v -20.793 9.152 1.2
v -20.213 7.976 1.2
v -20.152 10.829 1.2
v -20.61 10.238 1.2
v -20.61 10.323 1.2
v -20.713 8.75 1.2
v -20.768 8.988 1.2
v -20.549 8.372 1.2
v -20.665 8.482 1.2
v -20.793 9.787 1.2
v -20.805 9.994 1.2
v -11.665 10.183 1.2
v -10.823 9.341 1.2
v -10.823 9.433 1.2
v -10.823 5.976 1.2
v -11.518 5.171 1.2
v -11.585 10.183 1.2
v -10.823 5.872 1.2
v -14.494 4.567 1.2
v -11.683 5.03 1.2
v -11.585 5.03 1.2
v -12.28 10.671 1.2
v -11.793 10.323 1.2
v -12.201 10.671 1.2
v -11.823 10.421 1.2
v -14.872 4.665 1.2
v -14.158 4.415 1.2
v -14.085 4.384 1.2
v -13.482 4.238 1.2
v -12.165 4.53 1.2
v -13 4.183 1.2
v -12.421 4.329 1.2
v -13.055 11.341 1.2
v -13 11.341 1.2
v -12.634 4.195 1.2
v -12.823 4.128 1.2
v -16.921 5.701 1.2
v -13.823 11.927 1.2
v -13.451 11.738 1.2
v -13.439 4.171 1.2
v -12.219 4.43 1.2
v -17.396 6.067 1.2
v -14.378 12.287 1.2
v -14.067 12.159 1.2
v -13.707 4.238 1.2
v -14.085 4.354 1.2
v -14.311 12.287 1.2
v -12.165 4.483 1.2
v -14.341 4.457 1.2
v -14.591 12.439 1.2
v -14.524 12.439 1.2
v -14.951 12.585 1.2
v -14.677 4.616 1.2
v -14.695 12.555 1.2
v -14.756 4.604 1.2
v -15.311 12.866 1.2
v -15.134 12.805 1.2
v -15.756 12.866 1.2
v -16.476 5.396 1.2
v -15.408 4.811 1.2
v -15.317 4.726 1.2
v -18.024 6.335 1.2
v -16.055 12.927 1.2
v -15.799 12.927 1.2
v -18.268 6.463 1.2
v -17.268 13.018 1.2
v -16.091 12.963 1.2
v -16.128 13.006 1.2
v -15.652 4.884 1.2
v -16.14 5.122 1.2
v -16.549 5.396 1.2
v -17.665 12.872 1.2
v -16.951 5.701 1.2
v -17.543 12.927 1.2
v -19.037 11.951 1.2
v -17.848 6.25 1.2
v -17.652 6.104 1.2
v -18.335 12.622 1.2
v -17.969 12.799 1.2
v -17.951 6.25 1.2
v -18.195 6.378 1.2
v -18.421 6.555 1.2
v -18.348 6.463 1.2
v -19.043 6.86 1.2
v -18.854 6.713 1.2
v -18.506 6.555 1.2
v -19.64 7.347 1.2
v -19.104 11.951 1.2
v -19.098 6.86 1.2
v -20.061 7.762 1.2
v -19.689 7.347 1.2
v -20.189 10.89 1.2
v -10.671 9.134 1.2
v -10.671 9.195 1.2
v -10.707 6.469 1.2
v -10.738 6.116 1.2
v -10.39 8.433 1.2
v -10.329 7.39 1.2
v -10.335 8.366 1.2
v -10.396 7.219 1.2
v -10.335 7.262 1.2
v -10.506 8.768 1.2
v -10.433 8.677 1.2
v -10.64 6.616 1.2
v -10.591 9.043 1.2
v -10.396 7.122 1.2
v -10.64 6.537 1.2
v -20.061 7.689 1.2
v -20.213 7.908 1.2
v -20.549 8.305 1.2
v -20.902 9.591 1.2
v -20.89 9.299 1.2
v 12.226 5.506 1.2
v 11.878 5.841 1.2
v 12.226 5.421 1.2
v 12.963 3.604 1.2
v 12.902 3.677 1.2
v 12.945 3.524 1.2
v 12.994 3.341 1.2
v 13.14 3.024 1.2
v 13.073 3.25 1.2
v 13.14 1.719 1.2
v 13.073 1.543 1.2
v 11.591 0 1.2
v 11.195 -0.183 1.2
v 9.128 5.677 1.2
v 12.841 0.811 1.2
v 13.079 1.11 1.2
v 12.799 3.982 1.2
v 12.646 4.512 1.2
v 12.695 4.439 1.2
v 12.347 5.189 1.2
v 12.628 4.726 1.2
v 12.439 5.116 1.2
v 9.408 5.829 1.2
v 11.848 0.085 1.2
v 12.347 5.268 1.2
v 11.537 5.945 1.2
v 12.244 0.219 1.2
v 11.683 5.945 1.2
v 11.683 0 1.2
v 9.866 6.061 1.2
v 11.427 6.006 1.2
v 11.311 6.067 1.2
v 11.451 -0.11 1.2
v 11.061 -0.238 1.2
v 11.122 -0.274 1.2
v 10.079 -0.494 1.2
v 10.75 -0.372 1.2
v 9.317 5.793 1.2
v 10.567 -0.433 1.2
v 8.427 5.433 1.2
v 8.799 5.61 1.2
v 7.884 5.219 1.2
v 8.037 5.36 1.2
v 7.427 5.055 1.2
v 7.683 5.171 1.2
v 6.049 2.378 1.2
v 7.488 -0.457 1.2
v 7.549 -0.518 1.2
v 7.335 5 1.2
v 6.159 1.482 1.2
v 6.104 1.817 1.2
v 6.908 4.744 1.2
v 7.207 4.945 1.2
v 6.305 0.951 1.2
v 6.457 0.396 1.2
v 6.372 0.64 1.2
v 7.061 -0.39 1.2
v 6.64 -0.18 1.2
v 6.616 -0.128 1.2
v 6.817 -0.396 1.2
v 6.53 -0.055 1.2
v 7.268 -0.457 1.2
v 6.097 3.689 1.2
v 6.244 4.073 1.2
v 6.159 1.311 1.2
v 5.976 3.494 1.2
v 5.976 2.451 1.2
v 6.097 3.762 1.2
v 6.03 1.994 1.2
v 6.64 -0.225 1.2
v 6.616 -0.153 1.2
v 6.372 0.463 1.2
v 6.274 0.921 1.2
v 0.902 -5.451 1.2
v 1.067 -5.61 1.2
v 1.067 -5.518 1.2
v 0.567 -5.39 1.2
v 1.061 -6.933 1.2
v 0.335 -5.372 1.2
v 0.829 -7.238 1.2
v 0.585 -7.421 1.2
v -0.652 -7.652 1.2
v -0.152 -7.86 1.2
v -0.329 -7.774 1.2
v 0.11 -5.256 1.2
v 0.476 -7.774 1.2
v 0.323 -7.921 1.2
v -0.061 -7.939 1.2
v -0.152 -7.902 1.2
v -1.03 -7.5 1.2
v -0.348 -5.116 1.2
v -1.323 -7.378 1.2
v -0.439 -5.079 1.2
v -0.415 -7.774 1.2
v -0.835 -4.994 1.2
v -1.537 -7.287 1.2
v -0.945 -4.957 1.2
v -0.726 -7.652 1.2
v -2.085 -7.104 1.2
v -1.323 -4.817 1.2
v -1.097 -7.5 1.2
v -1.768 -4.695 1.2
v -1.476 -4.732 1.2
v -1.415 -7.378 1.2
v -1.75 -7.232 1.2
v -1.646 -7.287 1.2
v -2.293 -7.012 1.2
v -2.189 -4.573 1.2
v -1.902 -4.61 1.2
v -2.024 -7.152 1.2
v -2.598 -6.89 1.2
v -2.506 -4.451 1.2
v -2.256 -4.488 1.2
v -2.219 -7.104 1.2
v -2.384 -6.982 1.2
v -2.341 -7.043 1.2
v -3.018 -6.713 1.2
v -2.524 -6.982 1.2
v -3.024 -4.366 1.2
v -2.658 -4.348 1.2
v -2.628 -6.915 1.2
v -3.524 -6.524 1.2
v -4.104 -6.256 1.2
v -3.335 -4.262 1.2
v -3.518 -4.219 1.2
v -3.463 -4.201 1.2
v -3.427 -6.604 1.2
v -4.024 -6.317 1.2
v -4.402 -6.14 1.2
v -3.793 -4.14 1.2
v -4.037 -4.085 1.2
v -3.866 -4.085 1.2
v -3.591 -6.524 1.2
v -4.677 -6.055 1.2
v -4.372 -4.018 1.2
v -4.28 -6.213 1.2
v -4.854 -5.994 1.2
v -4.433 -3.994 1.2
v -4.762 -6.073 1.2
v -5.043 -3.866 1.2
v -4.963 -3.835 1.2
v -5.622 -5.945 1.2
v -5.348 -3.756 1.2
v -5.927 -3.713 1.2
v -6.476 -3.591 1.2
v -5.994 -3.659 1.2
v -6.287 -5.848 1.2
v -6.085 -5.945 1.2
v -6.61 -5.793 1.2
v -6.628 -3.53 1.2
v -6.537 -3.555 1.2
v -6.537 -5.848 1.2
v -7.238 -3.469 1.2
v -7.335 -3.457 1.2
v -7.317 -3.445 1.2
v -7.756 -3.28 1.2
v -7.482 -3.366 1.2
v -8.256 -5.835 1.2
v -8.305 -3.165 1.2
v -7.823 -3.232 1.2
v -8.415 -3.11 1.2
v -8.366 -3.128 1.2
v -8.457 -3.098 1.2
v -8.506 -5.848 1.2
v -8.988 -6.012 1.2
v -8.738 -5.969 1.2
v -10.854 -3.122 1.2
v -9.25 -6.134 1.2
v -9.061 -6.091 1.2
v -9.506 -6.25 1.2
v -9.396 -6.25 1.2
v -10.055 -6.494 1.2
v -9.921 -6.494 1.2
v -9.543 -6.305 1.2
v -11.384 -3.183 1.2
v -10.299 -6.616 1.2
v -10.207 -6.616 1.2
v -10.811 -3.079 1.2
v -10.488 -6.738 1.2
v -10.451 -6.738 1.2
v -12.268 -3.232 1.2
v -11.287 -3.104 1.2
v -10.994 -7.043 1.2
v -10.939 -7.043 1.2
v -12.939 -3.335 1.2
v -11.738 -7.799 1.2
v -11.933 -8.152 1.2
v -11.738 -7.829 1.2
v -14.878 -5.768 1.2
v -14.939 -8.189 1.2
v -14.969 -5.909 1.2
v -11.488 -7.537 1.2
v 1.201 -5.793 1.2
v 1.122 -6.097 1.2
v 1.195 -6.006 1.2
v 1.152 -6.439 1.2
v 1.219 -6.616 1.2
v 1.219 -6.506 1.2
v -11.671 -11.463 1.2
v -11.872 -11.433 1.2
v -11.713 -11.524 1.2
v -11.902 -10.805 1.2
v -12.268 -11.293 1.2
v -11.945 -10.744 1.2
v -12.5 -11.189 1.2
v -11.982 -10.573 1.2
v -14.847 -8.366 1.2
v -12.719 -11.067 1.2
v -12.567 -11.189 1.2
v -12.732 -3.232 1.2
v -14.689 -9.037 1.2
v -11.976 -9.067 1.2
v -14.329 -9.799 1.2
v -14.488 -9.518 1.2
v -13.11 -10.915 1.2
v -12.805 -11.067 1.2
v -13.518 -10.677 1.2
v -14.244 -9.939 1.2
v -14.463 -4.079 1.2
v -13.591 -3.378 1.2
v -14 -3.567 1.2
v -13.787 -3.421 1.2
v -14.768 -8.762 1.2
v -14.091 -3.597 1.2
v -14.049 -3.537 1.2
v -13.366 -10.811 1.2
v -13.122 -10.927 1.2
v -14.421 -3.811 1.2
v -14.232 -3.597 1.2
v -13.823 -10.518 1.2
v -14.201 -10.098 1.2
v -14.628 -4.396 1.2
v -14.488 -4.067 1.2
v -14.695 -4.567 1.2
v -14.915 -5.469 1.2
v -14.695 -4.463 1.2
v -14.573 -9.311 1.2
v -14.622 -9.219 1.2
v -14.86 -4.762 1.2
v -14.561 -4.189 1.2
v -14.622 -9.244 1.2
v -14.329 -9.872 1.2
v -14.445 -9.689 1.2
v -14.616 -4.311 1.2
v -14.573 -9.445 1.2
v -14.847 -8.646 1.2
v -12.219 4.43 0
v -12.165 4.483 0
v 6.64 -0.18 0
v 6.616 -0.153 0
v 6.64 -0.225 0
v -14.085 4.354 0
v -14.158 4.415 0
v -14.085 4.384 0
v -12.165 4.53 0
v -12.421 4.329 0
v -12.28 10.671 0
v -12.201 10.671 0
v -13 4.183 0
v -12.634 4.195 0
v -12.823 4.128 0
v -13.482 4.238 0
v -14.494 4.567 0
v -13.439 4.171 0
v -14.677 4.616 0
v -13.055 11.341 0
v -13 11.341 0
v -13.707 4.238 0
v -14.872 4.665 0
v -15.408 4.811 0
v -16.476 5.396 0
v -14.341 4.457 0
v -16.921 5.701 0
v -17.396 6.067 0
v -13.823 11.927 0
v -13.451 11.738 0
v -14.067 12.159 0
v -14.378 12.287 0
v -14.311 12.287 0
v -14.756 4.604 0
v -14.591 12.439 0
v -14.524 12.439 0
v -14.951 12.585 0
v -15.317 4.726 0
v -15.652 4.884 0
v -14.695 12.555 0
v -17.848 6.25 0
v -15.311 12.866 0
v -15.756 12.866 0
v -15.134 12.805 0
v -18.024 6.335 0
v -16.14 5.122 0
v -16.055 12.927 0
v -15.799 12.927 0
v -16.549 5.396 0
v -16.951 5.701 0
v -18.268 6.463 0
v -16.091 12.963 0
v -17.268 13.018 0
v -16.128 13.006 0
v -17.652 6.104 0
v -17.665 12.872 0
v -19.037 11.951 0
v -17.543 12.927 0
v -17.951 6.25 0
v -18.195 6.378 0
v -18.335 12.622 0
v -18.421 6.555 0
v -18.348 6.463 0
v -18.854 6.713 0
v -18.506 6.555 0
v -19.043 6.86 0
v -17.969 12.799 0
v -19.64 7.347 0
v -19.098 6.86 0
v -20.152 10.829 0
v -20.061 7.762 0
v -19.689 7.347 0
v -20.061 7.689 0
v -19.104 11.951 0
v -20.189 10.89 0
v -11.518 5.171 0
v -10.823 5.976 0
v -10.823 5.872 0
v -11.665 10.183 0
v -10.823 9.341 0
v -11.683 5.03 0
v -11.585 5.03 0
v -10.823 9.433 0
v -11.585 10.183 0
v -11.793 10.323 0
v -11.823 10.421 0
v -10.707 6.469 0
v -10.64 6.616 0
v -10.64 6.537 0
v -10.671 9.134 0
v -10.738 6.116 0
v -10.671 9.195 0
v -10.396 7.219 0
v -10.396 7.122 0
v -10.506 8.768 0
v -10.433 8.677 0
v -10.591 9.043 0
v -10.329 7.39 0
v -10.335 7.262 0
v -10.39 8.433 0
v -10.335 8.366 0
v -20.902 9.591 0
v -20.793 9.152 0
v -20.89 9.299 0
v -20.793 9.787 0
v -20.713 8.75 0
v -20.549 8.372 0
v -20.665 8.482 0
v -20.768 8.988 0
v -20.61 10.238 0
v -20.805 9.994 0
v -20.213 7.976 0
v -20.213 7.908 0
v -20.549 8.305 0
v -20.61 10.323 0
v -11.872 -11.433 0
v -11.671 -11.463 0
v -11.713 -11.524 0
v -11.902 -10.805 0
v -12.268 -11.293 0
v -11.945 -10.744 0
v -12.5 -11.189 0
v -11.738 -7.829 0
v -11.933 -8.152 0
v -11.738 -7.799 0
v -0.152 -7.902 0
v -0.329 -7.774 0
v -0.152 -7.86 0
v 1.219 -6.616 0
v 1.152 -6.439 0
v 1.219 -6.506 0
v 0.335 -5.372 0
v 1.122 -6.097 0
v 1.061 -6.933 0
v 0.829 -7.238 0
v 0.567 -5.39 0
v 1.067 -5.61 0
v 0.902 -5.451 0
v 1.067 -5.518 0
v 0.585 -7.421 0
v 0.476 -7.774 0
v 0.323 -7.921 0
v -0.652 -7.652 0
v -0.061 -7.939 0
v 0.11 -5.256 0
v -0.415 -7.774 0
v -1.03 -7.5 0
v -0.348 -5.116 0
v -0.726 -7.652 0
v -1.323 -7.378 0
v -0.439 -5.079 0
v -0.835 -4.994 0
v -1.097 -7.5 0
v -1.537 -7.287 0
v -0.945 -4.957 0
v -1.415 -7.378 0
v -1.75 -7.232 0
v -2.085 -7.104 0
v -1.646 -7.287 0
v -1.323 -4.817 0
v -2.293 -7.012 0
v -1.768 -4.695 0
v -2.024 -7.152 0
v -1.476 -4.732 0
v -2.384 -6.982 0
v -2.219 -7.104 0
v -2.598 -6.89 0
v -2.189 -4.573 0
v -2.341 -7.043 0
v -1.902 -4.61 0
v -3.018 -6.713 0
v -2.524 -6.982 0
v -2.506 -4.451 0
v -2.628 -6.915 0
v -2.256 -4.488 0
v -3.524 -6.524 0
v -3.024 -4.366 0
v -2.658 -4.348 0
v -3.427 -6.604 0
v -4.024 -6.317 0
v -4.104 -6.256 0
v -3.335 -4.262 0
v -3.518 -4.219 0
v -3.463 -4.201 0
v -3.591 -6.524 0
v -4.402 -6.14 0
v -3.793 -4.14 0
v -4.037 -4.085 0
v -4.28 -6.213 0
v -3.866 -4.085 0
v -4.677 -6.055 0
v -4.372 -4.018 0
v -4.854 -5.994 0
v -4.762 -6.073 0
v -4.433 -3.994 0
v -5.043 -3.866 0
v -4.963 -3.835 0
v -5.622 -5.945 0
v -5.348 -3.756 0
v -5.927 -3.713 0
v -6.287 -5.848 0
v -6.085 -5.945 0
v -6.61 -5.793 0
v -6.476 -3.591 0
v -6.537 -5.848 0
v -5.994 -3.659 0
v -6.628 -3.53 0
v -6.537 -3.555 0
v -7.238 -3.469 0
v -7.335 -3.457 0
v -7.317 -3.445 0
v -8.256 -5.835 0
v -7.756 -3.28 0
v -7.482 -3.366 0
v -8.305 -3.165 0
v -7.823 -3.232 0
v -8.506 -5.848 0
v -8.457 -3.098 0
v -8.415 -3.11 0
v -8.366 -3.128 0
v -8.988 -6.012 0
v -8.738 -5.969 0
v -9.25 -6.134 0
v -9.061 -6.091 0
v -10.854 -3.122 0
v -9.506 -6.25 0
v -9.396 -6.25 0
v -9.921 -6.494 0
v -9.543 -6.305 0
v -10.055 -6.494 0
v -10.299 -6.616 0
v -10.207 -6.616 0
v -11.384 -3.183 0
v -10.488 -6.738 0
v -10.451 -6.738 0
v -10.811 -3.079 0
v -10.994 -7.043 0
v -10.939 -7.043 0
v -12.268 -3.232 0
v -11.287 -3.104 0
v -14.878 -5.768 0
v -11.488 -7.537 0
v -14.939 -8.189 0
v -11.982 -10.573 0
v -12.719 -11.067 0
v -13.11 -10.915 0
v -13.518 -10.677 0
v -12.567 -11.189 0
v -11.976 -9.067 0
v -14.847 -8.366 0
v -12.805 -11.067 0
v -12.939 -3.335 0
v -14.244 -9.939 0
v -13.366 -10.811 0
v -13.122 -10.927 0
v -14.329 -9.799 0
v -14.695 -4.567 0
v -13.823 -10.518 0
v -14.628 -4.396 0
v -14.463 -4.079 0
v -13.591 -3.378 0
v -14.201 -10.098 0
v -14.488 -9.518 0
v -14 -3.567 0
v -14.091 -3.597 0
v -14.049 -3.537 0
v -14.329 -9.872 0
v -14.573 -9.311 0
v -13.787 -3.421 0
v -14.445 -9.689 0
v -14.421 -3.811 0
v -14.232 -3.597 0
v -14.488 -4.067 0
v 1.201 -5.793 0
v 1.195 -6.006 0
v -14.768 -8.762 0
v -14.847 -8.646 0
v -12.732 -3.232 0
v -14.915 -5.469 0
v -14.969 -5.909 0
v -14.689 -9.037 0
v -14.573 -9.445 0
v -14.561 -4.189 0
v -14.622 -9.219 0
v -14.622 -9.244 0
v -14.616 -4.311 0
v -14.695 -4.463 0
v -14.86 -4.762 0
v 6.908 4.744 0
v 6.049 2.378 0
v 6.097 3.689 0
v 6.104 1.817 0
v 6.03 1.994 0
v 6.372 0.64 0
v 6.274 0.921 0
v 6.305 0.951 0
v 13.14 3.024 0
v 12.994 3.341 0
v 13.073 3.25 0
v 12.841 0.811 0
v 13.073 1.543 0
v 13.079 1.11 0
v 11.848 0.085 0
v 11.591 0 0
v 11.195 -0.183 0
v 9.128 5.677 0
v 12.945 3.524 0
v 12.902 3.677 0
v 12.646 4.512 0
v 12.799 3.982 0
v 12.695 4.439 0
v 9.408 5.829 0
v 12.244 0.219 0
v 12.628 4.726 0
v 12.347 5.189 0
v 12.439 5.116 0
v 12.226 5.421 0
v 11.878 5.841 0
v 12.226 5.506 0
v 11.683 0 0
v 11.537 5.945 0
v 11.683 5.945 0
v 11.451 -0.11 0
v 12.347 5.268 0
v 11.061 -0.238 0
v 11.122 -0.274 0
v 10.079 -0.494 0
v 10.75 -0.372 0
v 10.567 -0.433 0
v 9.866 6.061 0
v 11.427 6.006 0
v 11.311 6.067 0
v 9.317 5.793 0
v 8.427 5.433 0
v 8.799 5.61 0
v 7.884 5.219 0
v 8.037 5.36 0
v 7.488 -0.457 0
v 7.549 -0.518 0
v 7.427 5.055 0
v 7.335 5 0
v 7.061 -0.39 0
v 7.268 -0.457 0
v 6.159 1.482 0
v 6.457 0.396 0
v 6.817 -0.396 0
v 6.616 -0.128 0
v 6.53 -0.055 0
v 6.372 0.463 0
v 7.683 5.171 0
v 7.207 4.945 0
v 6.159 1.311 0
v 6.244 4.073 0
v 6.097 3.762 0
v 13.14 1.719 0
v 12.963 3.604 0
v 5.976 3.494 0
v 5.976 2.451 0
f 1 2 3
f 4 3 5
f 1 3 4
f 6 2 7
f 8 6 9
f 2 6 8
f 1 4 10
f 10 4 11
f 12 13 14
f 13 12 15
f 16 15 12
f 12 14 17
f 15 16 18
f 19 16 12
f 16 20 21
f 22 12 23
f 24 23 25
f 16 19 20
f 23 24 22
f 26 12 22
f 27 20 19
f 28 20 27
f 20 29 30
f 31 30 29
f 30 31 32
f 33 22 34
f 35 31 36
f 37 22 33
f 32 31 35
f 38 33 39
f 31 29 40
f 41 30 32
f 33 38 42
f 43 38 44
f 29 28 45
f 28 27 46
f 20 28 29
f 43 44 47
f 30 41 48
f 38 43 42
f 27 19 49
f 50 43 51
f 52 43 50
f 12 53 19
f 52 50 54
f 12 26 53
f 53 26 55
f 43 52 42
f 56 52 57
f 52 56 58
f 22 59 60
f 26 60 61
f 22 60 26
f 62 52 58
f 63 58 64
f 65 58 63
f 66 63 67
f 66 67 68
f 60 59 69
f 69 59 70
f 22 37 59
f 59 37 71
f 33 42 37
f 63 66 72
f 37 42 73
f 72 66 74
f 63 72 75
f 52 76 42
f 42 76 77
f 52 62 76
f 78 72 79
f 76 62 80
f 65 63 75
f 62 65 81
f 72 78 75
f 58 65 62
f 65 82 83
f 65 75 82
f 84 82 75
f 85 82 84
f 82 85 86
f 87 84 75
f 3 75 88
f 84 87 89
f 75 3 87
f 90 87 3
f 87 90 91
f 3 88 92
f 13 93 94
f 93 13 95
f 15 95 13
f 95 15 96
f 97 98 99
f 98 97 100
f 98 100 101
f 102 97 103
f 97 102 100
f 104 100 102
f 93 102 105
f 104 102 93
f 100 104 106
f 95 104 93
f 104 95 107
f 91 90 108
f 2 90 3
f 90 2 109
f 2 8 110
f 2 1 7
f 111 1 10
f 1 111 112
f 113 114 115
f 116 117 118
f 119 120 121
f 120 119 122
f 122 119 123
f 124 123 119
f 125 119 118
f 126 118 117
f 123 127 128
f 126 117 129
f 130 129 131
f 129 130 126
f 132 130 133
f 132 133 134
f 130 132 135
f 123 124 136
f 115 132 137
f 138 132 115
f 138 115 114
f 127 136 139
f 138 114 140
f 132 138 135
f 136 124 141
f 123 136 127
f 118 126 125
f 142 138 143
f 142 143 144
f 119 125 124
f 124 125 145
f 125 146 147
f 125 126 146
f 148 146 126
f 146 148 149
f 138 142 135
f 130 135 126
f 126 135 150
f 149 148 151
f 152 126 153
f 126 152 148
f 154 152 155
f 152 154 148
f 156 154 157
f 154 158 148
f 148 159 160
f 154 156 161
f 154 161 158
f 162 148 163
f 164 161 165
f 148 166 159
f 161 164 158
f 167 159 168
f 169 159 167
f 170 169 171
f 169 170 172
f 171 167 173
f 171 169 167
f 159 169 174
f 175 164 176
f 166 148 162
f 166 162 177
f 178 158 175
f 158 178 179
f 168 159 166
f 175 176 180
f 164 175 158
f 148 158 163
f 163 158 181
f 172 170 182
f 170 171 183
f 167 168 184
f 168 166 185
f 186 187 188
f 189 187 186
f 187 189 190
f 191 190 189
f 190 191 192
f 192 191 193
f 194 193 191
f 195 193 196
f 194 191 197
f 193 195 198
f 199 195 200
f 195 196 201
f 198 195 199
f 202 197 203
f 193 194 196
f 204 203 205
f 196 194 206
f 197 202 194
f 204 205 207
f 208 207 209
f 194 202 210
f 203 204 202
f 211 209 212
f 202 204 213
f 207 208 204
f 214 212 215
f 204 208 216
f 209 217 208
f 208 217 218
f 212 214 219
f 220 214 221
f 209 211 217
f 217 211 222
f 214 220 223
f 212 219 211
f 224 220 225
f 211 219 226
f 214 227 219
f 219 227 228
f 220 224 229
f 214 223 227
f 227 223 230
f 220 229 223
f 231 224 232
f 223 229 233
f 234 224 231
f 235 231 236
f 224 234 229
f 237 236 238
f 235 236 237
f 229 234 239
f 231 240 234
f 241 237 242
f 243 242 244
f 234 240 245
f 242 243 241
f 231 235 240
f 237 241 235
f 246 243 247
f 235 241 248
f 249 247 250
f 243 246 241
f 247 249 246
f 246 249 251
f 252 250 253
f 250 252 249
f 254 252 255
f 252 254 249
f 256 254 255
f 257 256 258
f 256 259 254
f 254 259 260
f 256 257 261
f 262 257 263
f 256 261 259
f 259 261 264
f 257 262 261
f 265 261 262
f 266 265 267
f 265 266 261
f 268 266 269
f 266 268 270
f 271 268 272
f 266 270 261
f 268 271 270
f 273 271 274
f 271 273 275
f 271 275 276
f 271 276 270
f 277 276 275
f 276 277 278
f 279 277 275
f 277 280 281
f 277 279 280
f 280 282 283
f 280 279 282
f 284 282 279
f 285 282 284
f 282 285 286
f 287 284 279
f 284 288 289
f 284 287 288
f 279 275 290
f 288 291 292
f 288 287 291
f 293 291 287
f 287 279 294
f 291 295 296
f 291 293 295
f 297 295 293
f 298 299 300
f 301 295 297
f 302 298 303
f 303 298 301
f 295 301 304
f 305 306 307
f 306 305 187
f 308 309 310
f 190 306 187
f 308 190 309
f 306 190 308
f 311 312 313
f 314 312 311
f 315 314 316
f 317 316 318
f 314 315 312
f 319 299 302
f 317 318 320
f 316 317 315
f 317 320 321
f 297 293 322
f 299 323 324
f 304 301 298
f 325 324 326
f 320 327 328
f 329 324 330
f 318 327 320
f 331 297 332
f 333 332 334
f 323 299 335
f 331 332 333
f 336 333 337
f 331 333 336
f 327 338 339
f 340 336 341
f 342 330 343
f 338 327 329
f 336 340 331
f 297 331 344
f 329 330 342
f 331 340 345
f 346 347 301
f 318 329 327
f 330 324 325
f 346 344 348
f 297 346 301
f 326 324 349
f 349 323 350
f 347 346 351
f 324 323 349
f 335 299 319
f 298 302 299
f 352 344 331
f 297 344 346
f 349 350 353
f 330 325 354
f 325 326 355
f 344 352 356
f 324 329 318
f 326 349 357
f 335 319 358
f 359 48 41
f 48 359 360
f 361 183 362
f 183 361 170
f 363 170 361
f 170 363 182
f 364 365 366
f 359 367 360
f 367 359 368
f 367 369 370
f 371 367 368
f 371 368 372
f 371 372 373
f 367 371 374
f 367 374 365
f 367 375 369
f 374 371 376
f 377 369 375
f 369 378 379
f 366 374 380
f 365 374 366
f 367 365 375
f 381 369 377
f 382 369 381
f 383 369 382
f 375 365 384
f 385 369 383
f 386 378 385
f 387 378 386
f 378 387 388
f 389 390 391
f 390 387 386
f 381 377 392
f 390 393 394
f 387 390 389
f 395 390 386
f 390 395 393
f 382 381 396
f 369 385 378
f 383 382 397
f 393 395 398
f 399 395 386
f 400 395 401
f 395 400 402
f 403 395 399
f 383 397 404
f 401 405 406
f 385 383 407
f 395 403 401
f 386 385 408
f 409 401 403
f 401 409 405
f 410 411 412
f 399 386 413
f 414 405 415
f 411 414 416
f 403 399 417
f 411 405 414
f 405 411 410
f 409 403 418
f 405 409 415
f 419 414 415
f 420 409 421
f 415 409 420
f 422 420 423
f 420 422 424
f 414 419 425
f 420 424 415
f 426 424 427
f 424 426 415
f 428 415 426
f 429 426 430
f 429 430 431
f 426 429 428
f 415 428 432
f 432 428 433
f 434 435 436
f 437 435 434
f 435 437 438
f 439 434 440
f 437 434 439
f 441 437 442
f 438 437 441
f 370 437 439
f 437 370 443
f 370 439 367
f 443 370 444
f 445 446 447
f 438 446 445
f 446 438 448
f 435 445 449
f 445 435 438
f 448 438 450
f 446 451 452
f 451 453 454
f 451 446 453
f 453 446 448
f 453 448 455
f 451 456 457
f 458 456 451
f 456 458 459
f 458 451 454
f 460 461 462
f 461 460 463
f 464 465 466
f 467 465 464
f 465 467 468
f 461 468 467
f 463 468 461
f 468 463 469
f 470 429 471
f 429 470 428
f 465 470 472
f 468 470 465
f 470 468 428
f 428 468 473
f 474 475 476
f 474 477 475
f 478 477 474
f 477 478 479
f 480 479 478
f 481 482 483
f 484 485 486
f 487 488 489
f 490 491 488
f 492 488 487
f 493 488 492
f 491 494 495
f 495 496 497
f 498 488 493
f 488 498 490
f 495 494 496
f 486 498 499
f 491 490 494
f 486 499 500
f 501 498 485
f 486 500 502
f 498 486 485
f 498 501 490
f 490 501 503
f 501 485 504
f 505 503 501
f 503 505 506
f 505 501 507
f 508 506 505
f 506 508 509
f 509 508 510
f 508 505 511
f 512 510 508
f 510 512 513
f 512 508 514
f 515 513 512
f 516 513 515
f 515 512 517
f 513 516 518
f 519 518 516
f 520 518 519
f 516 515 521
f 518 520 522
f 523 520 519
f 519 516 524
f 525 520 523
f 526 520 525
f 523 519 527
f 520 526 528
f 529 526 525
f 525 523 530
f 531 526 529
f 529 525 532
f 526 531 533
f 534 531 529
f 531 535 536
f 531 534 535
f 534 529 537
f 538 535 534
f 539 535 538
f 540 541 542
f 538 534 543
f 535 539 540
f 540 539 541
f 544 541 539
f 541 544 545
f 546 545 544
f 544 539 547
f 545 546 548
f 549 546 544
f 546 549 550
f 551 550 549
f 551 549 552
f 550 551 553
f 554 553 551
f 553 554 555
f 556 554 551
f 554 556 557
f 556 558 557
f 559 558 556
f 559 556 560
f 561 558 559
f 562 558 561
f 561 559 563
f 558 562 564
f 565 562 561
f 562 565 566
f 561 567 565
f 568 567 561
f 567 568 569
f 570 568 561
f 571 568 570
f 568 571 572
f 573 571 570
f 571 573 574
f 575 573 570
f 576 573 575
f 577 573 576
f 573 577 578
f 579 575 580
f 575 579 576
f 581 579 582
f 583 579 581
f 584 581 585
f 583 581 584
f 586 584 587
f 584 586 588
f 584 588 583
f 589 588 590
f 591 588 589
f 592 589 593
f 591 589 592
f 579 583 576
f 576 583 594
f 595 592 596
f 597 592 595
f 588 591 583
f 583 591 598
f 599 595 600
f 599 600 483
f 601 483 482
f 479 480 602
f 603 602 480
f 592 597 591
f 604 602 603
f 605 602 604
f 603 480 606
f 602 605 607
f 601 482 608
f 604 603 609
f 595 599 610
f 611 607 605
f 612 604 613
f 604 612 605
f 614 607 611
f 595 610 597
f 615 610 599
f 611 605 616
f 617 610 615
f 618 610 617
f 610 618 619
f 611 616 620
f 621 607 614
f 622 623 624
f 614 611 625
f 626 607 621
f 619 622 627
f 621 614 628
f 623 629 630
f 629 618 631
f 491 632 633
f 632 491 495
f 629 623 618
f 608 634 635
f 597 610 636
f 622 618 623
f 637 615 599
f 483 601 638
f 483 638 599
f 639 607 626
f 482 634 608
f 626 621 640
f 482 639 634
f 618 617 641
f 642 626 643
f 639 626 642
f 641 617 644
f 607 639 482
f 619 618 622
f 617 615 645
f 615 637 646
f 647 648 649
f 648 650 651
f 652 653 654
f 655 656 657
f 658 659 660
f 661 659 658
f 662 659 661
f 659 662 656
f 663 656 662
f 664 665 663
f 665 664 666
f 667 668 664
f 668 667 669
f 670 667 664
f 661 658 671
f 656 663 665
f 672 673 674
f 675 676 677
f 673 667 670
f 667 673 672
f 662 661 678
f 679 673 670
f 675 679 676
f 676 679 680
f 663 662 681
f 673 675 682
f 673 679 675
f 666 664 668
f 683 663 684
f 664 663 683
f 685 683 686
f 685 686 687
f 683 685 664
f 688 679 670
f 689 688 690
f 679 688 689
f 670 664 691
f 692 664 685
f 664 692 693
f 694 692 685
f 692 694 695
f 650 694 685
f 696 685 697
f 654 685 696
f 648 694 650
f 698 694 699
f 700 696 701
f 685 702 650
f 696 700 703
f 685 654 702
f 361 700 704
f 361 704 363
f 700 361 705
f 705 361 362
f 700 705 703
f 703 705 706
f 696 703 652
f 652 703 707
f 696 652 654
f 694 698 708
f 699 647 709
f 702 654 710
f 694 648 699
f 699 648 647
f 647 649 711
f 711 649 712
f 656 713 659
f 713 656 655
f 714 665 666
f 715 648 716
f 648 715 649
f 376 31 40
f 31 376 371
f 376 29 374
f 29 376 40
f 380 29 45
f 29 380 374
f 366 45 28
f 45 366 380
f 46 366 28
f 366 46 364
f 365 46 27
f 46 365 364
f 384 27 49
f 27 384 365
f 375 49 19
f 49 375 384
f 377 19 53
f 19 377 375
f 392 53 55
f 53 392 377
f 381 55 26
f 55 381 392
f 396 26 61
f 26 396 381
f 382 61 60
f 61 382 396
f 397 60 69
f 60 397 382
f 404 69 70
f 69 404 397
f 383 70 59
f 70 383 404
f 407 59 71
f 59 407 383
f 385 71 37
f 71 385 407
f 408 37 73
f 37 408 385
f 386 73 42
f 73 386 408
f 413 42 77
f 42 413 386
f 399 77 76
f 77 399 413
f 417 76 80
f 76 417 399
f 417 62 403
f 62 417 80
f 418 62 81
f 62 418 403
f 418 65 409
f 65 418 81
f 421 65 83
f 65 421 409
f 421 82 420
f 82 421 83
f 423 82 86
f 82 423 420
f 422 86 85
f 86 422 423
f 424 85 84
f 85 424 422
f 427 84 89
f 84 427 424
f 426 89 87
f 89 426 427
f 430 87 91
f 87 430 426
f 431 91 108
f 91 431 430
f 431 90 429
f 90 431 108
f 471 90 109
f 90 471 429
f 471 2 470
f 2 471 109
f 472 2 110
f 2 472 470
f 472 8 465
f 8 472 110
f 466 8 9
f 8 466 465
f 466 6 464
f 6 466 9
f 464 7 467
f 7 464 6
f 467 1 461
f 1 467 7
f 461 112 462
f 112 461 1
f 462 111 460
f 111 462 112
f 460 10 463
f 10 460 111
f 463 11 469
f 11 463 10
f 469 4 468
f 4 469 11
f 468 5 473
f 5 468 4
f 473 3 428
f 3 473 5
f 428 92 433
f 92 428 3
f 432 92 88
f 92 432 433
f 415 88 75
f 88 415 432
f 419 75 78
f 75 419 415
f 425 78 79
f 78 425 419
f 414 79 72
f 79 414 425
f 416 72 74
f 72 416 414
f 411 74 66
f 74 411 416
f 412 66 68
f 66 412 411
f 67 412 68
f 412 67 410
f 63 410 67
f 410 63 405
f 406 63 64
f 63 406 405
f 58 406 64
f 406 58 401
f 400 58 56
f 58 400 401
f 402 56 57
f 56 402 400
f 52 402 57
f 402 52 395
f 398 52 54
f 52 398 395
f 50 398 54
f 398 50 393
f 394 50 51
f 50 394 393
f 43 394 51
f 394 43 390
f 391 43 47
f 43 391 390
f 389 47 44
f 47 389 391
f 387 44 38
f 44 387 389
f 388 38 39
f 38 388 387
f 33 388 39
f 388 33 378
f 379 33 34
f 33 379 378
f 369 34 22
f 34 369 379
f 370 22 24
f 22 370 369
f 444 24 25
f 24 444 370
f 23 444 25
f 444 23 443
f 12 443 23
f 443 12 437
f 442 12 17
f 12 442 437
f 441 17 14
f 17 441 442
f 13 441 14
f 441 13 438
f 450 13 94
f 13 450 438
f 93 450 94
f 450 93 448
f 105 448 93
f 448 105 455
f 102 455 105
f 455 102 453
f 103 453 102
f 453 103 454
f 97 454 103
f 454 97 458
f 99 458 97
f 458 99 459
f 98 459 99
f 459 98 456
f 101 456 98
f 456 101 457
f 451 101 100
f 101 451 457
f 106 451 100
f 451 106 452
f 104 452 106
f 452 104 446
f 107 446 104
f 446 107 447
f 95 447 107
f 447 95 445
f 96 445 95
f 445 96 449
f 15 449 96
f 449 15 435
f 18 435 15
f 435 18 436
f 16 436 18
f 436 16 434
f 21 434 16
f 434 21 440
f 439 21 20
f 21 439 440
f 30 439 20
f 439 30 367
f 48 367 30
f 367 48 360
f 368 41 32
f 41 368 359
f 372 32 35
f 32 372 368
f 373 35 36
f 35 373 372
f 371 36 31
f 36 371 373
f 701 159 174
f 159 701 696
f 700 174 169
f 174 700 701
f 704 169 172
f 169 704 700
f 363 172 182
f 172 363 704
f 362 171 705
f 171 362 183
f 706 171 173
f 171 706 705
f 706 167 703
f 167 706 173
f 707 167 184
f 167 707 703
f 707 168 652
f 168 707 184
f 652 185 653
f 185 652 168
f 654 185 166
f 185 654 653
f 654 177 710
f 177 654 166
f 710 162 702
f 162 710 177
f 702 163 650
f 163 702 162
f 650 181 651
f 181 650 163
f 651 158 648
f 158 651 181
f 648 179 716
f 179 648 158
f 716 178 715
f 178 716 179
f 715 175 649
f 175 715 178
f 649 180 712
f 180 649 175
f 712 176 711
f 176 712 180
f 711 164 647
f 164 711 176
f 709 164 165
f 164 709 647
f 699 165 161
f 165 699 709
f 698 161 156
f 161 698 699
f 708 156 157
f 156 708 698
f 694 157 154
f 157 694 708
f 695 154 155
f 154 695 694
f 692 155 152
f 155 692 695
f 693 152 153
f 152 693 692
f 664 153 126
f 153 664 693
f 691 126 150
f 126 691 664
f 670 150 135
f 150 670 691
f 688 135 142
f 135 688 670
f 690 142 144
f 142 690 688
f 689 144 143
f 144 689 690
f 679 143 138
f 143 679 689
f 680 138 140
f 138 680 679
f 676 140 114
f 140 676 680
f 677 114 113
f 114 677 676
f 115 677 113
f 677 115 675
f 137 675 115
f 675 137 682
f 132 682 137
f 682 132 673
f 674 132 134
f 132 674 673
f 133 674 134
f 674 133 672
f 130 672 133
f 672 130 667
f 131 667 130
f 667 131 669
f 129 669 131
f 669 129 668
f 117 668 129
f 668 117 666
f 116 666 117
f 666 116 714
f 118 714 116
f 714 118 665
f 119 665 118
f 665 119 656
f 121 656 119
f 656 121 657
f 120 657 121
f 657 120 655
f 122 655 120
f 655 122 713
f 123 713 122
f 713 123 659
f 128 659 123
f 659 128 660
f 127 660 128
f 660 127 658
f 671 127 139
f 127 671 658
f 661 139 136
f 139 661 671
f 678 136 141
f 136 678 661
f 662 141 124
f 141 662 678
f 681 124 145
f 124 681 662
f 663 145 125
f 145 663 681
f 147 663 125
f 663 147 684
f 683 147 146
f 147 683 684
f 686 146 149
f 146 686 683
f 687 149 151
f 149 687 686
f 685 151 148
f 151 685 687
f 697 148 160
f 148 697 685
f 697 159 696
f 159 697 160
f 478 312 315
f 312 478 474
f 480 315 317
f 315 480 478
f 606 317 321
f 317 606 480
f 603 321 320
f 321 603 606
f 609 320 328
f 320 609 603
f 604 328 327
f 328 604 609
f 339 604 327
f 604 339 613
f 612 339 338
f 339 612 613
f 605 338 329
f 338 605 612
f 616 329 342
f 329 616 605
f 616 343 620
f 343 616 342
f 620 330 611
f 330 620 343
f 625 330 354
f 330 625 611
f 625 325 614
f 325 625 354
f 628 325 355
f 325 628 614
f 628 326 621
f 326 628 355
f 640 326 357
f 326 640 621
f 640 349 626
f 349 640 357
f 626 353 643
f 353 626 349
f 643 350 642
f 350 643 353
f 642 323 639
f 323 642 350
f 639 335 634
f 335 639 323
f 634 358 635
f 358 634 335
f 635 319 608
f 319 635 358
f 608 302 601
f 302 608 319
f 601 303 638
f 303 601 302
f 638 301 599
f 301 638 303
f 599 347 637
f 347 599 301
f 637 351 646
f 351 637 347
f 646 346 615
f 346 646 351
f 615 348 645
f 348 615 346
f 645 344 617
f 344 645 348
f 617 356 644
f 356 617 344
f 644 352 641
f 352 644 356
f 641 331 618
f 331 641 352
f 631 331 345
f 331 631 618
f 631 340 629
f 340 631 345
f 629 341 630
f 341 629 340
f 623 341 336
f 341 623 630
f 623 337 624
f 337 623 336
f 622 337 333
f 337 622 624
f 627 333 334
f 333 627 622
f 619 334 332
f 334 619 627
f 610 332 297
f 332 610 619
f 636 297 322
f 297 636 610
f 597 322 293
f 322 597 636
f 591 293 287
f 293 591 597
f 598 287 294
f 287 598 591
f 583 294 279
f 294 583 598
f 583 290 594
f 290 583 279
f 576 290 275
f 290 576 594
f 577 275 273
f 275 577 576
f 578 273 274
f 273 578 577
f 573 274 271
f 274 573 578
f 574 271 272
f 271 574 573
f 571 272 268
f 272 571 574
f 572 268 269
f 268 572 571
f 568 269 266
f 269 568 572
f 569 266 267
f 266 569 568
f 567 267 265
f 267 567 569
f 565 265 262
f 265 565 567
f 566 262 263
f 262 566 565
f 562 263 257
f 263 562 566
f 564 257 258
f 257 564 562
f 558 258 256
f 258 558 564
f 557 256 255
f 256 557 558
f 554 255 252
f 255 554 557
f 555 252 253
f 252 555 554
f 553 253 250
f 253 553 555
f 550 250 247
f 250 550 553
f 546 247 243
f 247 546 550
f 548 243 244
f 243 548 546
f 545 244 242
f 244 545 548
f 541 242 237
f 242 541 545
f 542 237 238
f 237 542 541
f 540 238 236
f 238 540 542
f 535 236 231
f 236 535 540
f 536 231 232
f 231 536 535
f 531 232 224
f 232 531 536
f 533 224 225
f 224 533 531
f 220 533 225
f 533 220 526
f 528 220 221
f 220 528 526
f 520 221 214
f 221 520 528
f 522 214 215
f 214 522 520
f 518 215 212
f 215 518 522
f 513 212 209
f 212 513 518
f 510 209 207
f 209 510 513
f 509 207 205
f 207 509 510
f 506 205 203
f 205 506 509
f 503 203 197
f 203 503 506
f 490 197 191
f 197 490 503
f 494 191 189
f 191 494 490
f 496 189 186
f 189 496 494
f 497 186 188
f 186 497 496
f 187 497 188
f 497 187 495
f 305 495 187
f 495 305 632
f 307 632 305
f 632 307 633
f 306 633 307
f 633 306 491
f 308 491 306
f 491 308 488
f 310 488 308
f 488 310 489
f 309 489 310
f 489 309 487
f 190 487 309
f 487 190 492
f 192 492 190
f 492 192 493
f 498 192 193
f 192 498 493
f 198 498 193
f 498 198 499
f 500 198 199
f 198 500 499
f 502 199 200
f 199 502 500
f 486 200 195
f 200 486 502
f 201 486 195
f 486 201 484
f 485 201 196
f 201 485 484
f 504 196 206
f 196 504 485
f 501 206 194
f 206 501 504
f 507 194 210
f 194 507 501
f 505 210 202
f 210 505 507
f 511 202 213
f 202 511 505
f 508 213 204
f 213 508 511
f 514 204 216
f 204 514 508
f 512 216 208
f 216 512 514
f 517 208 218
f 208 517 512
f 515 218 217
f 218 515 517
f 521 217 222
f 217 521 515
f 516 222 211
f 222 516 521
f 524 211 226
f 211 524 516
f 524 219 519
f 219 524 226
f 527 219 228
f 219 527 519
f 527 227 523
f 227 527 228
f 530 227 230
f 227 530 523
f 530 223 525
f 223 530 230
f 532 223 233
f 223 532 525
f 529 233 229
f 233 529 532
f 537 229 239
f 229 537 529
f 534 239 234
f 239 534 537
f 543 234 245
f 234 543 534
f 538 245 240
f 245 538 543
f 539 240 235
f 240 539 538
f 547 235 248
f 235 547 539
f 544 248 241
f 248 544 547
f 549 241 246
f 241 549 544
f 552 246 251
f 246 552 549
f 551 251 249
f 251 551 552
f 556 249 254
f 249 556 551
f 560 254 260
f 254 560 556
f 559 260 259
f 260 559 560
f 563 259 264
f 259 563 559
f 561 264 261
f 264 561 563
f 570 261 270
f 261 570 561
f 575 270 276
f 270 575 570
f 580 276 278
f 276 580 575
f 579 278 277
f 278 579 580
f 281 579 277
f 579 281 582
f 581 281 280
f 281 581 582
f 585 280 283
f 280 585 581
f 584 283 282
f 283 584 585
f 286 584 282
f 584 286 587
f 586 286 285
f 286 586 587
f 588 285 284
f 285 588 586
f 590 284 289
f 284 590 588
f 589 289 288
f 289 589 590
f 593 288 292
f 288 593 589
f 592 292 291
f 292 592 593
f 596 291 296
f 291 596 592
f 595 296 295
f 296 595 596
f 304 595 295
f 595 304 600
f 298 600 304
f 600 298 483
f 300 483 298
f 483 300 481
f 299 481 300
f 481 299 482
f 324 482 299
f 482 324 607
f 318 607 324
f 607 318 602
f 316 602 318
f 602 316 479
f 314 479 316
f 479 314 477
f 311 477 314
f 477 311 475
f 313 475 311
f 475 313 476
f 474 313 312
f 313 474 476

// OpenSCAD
//=======================================================================
// TenBuck.scad
//
// Ten Buck Sixer band logo for coins or disks
// 
// DrTomFlint 28 March 2024
//======================================================================


use <./TenBuck2Black.scad>
use <./TenBuck2Blue.scad>
use <./TenBuck2Yellow.scad>
use <./TenBuck2Brown.scad>
use <./TenBuck2Red.scad>

layer = 0.3;
thick = 4*layer;    // thickness not including top and bottom

mag=80;   // scaling

//----------------------------------------------------------------------
module TenBlack(){
  
  intersection(){
    scale([mag,mag,thick])
    TenBuck2Black();
    
    cube([0.9*mag,0.9*mag,3*thick],center=true);
  }
}
//----------------------------------------------------------------------
module TenBlack2(){
  
  intersection(){
    translate([0,0,-thick/2])
    scale([mag,mag,2*thick])
    TenBuck2Black();
    cube([0.9*mag,0.9*mag,3*thick],center=true);
  }
  
}
//----------------------------------------------------------------------
module TenBlue(){
  
  intersection(){
    difference(){
      scale([mag,mag,thick])
      TenBuck2Blue();
      
      TenBlack2();
    }
    cube([0.9*mag,0.9*mag,3*thick],center=true);
  }
}
//----------------------------------------------------------------------
module TenBrown(){
  
  intersection(){
    difference(){
      scale([mag,mag,thick])
      TenBuck2Brown();
      
      TenBlack2();
    }
    cube([0.9*mag,0.9*mag,3*thick],center=true);
  }
  
}
//----------------------------------------------------------------------
module TenBrown2(){
  
  intersection(){
    difference(){
      translate([0,0,-thick/3])
      scale([mag,mag,2*thick])
      TenBuck2Brown();
      
      //~ TenBlack2();
    }
    cube([0.9*mag,0.9*mag,3*thick],center=true);
  }
  
}
//----------------------------------------------------------------------
module TenYellow(){
  
  intersection(){
    difference(){
      scale([mag,mag,thick])
      TenBuck2Yellow();
      
      
      TenBlack2();
      TenBrown2();
    }
    cube([0.9*mag,0.9*mag,3*thick],center=true);
  }
  
}
//----------------------------------------------------------------------
module TenRed(){
  
  intersection(){
    difference(){
      scale([mag,mag,thick])
      TenBuck2Red();
      
      TenBlack2();
    }
  
    cube([0.9*mag,0.9*mag,3*thick],center=true);
  }
}


//----------------------------------------------------------------------
module TenLoop(){
  
  translate([0,0.31*mag,0])
  difference(){
    cylinder(r=1.5,h=thick,$fn=22);
    cylinder(r=0.75,h=3*thick,center=true,$fn=22);
  }
}

//======================================================================

//~ TenBlack();
//~ TenBlue();
//~ TenYellow();
//~ TenBrown();
TenRed();

//~ scale([mag,mag,thick])
//~ TenBuck2Black();

//~ TenLoop();

//======================================================================
